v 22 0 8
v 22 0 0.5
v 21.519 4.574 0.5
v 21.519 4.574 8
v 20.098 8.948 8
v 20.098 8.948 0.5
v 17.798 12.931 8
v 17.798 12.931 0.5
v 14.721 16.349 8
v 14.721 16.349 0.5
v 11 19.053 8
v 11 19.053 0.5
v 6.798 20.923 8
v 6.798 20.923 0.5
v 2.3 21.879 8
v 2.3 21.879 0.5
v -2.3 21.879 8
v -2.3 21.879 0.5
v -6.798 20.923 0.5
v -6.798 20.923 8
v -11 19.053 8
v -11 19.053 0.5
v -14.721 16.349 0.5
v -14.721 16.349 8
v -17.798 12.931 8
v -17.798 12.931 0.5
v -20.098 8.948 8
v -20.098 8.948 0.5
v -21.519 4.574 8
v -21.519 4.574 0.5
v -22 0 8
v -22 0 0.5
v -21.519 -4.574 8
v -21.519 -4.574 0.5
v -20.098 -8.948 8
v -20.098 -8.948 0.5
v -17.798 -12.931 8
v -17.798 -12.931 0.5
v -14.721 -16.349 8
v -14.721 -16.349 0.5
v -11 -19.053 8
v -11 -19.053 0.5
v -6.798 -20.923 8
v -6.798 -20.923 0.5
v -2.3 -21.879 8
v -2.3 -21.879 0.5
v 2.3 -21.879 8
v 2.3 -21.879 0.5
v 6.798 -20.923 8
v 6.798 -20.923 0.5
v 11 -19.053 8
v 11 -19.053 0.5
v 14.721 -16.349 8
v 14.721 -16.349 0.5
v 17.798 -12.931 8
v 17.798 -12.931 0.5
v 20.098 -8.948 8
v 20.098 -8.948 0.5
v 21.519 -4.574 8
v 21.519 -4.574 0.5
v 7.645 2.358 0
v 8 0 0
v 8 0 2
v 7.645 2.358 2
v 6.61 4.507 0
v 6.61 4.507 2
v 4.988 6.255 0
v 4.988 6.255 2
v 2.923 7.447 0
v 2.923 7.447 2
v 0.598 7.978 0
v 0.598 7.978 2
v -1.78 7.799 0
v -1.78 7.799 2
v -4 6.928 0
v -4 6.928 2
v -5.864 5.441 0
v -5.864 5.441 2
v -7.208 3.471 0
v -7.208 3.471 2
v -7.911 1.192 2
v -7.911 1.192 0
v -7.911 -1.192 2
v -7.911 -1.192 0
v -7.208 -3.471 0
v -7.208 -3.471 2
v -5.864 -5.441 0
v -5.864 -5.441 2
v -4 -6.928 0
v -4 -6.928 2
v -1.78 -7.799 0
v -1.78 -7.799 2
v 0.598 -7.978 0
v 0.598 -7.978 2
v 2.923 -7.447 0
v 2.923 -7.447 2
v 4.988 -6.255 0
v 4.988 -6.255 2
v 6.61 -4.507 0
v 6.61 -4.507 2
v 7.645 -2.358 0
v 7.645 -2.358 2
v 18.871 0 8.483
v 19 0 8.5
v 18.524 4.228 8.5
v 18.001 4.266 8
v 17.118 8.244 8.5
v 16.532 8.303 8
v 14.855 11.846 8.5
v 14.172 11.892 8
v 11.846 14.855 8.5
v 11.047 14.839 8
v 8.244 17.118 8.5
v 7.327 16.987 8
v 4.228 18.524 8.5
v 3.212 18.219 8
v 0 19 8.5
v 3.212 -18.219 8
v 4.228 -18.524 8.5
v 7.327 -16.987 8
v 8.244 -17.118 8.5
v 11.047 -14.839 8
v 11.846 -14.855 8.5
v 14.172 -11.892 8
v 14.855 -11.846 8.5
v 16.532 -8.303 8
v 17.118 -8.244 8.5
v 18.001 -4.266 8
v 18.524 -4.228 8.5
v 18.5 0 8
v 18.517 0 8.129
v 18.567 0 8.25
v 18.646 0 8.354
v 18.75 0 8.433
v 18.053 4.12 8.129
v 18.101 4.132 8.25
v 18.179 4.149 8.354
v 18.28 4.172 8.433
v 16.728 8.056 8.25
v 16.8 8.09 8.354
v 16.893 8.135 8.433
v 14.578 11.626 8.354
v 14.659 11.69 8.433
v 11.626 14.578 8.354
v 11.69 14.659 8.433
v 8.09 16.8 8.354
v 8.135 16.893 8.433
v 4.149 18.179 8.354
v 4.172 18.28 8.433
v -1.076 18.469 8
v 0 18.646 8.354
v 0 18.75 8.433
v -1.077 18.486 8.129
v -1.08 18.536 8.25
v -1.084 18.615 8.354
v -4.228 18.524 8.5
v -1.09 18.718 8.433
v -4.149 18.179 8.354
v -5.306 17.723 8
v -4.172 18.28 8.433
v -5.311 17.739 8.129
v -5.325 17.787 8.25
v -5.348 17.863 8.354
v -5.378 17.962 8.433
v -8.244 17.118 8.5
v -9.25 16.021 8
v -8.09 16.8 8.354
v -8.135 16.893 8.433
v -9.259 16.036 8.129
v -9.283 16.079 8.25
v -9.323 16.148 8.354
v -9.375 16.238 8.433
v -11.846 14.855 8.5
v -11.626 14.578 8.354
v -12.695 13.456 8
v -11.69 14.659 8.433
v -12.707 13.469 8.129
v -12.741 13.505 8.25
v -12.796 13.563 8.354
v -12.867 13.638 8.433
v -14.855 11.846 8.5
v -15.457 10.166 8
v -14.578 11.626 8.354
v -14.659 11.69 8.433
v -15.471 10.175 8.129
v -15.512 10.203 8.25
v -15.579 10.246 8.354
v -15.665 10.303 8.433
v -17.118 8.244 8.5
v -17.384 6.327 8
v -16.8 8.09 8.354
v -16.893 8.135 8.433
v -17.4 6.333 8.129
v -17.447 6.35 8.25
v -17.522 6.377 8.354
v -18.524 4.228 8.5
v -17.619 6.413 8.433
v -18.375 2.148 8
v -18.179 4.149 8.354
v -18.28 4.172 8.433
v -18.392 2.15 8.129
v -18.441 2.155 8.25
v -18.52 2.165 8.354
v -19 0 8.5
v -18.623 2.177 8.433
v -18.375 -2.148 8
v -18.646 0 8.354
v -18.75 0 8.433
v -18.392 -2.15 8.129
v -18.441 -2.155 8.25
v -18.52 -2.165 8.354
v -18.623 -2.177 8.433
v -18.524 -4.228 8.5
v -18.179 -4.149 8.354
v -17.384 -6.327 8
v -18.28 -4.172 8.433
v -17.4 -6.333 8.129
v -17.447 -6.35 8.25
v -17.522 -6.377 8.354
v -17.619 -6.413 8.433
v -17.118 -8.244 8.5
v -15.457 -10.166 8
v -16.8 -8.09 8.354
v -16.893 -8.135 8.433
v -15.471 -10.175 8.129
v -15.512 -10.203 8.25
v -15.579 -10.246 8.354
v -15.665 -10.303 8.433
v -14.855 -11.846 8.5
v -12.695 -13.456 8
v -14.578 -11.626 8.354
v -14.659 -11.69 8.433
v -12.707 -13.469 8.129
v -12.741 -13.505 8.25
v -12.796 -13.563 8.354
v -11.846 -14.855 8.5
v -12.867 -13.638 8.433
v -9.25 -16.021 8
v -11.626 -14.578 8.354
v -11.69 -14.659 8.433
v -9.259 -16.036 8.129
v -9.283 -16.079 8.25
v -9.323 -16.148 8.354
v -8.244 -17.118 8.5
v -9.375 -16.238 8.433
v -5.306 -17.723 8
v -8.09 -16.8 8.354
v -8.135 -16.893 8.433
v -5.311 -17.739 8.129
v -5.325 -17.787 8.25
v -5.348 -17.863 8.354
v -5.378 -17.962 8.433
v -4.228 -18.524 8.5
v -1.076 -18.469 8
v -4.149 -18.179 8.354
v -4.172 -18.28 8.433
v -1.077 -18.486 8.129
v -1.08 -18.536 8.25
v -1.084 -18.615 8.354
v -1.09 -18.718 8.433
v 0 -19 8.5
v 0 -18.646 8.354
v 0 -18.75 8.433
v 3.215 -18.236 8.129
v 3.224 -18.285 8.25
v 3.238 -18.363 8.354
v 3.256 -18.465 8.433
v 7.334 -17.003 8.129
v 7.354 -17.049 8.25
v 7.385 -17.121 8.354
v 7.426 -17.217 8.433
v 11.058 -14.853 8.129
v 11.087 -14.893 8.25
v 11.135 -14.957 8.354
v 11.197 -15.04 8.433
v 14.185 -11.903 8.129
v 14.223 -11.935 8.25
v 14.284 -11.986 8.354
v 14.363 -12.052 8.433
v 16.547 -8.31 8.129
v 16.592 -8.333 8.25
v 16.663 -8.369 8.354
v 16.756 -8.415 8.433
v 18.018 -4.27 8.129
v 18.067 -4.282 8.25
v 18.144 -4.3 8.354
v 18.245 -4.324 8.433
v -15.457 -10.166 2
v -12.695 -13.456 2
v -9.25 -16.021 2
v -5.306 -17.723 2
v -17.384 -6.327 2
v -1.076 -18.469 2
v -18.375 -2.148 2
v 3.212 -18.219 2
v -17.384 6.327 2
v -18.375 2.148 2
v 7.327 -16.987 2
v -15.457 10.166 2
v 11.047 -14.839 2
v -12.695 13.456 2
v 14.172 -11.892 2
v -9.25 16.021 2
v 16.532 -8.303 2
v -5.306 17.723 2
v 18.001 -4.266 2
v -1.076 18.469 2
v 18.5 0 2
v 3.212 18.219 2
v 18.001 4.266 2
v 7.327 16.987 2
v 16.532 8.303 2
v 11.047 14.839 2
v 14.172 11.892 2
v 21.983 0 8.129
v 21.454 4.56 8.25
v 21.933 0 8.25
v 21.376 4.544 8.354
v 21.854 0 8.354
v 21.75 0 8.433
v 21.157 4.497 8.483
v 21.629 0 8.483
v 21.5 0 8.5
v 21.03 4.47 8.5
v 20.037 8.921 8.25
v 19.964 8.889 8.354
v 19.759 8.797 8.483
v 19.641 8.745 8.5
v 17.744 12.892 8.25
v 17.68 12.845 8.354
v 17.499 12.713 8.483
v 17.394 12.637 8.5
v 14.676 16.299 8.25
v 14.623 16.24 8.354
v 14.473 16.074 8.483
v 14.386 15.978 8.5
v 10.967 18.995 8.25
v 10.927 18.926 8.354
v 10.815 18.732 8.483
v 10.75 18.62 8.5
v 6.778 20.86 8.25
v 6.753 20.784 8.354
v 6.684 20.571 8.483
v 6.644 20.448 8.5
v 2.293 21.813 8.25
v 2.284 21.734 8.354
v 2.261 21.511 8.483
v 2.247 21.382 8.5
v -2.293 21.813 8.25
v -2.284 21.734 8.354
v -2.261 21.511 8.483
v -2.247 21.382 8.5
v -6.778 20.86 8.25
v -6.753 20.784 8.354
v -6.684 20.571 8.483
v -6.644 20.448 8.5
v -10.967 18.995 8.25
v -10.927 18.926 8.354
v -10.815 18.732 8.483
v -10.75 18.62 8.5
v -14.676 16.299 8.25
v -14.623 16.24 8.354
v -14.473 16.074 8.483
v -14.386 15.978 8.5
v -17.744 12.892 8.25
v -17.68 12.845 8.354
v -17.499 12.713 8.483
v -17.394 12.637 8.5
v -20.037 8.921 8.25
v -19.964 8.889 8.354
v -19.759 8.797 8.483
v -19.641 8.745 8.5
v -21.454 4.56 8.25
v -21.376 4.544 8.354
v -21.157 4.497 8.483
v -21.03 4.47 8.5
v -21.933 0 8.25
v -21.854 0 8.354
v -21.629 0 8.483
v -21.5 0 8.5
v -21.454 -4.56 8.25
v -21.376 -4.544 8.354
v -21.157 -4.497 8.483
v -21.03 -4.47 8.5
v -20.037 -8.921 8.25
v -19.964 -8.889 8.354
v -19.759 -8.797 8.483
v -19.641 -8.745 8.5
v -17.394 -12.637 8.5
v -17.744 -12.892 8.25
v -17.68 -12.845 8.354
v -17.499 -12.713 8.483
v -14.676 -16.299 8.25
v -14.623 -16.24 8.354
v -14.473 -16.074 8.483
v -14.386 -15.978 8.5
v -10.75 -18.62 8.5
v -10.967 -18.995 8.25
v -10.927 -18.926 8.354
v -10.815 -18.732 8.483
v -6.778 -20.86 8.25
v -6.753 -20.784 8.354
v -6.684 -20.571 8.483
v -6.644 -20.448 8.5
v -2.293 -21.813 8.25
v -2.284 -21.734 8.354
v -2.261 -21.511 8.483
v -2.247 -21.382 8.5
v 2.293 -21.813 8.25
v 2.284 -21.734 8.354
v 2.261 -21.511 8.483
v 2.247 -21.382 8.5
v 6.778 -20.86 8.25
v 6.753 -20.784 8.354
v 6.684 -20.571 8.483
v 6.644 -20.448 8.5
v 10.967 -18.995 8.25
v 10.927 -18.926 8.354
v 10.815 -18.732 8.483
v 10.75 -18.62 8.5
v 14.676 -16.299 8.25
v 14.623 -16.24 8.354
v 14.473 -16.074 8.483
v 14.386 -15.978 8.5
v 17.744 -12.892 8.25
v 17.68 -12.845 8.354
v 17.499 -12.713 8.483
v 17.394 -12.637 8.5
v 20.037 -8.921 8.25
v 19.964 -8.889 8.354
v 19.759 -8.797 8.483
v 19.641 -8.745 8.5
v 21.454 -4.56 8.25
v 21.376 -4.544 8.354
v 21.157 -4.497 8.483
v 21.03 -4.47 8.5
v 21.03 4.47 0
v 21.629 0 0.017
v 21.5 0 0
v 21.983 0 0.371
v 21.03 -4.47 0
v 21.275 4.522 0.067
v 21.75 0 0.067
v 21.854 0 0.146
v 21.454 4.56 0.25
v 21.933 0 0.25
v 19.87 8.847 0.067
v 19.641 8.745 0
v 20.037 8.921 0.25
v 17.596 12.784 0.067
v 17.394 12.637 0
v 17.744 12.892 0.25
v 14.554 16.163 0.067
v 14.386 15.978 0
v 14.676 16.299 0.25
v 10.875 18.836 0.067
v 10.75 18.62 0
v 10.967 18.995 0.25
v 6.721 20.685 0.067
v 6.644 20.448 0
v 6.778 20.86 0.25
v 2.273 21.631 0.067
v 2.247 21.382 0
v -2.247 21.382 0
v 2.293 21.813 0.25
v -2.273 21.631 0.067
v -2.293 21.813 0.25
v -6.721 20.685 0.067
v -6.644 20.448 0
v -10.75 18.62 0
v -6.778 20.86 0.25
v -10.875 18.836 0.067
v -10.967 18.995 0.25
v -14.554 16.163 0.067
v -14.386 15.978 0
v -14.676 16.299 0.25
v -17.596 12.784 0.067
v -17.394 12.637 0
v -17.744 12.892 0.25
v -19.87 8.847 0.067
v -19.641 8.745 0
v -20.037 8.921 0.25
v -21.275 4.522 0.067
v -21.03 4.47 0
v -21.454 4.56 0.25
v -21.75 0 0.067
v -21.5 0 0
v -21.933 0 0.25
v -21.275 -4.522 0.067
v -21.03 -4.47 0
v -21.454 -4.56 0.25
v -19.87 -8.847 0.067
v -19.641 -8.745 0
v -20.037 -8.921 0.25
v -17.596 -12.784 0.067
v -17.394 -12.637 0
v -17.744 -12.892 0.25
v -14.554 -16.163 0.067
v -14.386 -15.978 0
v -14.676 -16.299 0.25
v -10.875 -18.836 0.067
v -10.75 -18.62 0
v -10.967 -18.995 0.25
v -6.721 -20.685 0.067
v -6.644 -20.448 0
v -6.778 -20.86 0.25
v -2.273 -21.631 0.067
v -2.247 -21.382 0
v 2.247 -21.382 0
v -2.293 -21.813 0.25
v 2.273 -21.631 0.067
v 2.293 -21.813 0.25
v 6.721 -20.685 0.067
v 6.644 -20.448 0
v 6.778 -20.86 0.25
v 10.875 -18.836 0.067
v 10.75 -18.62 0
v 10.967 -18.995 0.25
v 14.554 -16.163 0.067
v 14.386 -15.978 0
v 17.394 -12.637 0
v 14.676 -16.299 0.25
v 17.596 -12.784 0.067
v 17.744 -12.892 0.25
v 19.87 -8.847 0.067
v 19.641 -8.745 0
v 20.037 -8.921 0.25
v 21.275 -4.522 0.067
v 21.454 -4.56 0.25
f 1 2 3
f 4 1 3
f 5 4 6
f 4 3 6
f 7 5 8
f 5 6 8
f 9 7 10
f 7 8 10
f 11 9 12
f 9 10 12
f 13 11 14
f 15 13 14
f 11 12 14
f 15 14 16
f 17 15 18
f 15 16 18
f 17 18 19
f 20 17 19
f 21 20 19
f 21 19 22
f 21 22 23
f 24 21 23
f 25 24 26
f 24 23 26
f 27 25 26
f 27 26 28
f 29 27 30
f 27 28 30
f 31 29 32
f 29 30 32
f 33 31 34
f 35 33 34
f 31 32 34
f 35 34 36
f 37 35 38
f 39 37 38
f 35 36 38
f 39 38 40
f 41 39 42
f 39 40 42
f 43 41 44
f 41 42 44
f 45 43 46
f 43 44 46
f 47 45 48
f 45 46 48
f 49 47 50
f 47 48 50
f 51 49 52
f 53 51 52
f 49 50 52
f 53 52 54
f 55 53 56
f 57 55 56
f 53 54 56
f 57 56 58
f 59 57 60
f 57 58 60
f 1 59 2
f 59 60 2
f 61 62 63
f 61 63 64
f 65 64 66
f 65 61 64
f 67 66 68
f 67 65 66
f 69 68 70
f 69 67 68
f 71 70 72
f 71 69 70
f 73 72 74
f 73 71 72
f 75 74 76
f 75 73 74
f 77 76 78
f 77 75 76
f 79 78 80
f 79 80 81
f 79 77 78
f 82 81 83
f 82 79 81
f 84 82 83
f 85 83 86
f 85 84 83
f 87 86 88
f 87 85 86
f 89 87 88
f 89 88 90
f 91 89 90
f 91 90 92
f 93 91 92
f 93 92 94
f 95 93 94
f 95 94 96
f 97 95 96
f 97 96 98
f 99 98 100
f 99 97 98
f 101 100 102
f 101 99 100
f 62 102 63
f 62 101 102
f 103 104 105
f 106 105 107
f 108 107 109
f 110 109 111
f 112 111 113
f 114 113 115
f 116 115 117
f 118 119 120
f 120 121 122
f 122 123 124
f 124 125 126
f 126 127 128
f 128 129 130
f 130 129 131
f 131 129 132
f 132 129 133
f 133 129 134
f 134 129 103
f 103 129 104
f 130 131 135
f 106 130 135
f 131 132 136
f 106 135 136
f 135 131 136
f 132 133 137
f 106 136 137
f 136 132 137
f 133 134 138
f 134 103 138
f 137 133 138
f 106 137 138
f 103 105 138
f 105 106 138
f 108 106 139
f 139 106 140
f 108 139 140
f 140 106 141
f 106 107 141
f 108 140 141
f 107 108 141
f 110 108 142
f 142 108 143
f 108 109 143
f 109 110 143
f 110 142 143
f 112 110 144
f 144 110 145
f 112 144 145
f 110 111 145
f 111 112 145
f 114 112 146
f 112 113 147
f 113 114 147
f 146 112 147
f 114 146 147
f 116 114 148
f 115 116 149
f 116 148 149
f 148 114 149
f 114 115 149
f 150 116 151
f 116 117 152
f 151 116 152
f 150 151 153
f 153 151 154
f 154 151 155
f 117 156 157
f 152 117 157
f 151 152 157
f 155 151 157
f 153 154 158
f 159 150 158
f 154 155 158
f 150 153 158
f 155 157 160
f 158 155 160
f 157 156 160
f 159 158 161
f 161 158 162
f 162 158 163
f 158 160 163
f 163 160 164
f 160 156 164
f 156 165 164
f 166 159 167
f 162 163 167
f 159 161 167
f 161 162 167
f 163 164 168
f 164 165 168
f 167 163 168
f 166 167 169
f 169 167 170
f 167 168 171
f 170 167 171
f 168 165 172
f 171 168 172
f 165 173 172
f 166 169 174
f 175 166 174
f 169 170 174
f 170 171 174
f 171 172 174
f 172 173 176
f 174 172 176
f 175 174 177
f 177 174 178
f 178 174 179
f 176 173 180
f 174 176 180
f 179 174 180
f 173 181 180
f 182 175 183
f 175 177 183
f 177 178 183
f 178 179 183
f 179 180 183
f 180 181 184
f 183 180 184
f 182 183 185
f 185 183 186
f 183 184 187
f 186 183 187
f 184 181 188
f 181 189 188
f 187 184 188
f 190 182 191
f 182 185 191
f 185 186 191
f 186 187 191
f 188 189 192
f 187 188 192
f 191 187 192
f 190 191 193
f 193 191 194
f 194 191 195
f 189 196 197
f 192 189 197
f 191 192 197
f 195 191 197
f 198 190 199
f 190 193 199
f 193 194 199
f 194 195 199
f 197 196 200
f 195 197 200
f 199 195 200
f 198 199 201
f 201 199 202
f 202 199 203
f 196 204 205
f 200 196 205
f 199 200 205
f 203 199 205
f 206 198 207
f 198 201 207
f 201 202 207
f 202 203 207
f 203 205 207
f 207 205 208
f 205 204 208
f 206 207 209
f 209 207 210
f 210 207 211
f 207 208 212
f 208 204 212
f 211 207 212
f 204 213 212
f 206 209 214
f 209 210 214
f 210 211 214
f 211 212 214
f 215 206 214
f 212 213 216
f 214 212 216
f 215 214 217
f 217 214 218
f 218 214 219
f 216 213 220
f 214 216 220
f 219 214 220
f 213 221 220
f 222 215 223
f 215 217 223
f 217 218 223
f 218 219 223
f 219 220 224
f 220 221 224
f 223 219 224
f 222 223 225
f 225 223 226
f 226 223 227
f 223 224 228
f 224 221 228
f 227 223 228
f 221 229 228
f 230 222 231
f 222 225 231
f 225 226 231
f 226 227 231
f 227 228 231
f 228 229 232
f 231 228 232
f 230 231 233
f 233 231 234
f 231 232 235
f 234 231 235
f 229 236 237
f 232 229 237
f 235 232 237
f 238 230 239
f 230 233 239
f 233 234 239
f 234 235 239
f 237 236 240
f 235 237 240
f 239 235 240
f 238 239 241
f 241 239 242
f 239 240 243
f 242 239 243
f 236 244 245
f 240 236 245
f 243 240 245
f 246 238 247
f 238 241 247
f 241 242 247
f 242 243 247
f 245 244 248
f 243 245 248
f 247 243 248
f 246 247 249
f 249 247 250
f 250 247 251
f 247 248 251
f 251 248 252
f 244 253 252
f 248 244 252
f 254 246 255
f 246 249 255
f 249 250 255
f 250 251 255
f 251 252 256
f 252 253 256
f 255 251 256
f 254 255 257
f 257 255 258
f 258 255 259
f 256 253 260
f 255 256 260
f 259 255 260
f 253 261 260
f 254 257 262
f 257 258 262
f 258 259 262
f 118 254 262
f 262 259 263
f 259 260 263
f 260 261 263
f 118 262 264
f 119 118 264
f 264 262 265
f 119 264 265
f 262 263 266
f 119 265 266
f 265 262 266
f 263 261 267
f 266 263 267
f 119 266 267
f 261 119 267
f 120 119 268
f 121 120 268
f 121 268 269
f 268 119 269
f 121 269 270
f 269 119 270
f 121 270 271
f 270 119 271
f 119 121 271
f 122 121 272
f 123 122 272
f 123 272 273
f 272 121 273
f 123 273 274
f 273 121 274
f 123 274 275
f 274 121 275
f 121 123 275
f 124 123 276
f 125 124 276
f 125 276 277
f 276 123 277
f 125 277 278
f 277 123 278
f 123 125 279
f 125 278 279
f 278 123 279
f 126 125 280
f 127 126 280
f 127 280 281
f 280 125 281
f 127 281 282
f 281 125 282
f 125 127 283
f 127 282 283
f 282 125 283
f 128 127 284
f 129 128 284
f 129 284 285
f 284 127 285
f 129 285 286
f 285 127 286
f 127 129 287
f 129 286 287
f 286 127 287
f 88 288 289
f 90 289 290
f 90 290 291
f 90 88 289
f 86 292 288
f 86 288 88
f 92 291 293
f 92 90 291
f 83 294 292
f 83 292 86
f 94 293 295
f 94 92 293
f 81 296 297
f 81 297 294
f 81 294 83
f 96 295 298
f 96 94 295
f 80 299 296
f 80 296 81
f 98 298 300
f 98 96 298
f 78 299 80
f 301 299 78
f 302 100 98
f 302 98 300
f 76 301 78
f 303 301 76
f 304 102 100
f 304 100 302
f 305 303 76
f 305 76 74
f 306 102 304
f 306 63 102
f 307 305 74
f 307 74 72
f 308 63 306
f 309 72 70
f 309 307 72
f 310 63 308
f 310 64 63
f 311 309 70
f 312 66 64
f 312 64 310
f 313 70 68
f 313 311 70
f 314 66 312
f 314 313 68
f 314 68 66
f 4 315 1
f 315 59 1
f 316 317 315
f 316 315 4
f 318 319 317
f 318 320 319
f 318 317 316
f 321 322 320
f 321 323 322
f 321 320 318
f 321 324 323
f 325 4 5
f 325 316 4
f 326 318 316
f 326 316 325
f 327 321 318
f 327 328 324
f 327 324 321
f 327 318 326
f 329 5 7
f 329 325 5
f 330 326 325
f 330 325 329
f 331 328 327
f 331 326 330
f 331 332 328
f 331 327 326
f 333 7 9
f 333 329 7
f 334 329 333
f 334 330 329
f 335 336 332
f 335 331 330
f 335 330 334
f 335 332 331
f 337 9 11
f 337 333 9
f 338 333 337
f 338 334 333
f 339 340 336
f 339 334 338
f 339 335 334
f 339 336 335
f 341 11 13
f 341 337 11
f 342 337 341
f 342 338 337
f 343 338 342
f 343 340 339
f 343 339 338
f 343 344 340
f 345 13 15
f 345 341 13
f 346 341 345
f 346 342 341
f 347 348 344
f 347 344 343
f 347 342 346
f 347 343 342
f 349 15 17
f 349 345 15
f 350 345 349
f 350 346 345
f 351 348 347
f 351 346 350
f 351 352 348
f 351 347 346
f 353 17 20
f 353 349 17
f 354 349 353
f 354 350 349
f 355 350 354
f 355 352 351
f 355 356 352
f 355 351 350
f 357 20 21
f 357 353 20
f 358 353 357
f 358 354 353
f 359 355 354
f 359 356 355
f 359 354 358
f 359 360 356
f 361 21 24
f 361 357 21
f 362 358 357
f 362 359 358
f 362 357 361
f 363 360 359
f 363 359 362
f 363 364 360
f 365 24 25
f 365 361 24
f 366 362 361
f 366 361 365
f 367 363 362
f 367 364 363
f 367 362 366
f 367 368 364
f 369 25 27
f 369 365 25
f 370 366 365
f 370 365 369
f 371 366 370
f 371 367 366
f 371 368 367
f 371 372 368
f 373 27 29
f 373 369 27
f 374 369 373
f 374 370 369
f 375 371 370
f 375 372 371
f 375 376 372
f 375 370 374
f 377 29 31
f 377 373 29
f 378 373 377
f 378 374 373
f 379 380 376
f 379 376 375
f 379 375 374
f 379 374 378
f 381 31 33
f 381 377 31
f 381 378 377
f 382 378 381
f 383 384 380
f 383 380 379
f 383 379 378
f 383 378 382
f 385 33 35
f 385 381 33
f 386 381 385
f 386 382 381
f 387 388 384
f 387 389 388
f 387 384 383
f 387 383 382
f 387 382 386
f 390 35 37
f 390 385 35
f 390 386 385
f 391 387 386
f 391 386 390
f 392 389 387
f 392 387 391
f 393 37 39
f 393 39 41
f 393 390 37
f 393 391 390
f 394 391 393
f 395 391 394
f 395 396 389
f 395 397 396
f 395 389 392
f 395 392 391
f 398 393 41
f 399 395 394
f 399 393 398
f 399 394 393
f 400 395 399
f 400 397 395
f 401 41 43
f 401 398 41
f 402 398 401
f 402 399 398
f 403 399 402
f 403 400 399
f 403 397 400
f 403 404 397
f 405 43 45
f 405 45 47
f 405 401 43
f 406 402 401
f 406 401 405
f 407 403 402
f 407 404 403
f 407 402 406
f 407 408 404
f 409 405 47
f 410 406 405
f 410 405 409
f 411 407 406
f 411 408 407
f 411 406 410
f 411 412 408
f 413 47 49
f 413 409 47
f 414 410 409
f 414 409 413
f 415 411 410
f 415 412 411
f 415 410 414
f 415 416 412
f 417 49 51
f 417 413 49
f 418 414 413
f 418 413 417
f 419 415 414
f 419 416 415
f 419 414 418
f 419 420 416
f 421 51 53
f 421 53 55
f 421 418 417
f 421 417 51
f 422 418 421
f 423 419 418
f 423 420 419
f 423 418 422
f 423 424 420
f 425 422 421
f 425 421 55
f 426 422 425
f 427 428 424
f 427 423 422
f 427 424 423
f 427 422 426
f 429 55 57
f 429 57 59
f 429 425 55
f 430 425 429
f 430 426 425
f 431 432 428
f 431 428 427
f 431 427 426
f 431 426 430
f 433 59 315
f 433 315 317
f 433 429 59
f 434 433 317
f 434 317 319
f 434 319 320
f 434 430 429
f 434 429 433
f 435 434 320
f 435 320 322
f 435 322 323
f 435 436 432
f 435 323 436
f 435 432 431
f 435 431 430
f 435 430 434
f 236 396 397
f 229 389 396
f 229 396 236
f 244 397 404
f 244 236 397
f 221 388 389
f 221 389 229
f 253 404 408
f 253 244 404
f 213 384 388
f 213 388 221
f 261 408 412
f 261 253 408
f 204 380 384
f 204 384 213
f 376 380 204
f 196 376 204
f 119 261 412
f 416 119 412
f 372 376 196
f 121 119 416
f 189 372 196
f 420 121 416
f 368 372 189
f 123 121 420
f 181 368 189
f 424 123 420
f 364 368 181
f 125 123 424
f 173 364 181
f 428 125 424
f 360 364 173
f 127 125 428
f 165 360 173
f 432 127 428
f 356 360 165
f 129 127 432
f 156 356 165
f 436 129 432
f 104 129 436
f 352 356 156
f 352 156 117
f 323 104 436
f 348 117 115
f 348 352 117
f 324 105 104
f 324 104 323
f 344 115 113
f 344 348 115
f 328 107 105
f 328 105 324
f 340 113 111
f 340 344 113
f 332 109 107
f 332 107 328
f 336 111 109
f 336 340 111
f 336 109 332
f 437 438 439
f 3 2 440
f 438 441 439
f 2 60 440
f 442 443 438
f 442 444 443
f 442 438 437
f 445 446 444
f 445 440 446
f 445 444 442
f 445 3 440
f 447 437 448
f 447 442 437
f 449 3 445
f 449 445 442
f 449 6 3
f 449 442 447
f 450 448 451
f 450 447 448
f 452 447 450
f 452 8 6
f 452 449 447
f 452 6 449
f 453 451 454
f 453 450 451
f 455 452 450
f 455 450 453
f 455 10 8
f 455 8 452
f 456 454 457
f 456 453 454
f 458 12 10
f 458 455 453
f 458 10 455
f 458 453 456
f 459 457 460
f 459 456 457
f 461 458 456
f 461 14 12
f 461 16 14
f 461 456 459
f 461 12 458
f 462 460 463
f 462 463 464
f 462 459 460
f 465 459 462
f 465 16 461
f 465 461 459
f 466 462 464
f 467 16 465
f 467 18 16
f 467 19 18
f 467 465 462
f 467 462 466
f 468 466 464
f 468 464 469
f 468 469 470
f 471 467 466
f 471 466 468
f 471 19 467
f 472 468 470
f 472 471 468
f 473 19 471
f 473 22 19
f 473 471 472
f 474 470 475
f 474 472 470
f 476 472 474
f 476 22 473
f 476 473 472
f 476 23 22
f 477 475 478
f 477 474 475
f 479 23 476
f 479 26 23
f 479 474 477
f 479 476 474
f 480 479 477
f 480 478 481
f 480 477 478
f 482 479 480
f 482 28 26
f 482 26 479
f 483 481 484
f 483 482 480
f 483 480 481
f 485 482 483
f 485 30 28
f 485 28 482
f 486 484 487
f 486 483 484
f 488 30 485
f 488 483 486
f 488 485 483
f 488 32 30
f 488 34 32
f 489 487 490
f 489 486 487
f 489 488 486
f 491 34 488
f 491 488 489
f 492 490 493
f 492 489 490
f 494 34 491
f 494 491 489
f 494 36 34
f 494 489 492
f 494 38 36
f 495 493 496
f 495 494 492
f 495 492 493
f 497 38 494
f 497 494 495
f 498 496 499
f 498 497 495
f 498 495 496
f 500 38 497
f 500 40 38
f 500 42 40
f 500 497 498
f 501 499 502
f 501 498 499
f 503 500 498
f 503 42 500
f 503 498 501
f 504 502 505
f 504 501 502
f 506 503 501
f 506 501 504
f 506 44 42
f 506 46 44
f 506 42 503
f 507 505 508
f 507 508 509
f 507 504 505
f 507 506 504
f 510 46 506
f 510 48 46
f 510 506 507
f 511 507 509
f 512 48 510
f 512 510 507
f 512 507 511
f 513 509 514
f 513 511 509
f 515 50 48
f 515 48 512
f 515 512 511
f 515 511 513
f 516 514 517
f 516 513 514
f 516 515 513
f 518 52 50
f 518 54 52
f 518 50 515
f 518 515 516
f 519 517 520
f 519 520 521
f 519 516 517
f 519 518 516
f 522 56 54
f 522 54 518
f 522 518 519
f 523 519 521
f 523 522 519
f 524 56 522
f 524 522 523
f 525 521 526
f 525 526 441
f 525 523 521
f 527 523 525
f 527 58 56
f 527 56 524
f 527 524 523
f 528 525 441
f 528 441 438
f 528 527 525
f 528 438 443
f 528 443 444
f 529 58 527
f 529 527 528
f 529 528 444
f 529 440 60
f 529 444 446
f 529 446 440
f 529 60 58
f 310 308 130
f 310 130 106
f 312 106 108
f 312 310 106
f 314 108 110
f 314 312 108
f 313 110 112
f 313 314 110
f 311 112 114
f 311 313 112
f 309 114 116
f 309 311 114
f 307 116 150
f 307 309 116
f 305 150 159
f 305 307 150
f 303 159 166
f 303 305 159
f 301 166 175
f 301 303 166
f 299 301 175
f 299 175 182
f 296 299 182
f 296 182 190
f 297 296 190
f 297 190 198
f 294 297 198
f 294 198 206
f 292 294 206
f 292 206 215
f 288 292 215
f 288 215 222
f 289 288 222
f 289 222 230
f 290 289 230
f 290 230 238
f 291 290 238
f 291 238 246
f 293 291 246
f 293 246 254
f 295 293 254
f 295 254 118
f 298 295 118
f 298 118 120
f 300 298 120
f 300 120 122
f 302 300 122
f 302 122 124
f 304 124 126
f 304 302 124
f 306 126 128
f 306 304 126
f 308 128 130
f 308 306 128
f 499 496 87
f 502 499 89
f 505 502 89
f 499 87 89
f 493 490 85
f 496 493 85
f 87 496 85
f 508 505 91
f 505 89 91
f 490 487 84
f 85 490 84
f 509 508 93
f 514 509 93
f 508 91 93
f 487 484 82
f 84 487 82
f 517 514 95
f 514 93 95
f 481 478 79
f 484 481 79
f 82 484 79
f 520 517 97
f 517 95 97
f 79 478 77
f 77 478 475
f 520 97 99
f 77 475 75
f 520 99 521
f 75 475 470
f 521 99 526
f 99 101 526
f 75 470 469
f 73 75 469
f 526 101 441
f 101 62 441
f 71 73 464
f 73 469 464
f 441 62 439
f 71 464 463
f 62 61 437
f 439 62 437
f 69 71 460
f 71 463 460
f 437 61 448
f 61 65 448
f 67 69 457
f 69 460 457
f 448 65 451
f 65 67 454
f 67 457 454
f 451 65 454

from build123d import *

# Parameters (mm, degrees)
F0_R     = 22
F0_R_2   = 18.5
F1_DEPTH = 8.5
F0_R_3   = 8
F2_DEPTH = 2
F3_R     = 0.5


with BuildPart() as f1:
    # F0 (on Top) → F1 (new body)
    with BuildSketch(Plane.XY):
        Circle(F0_R)
        Circle(F0_R_2, mode=Mode.SUBTRACT)
    extrude(amount=F1_DEPTH)

    # F0 (on Top) → F2 (join)
    with BuildSketch(Plane.XY):
        Circle(F0_R_2)
        Circle(F0_R_3, mode=Mode.SUBTRACT)
    extrude(amount=F2_DEPTH)

    # F3
    f3_edges = [f1.edges().sort_by_distance(p)[0] for p in [
        (-22, 0, 8.5),
        (-22, 0, 0),
        (-18.5, 0, 8.5),
    ]]
    fillet(f3_edges, radius=F3_R)


solid = f1.part
